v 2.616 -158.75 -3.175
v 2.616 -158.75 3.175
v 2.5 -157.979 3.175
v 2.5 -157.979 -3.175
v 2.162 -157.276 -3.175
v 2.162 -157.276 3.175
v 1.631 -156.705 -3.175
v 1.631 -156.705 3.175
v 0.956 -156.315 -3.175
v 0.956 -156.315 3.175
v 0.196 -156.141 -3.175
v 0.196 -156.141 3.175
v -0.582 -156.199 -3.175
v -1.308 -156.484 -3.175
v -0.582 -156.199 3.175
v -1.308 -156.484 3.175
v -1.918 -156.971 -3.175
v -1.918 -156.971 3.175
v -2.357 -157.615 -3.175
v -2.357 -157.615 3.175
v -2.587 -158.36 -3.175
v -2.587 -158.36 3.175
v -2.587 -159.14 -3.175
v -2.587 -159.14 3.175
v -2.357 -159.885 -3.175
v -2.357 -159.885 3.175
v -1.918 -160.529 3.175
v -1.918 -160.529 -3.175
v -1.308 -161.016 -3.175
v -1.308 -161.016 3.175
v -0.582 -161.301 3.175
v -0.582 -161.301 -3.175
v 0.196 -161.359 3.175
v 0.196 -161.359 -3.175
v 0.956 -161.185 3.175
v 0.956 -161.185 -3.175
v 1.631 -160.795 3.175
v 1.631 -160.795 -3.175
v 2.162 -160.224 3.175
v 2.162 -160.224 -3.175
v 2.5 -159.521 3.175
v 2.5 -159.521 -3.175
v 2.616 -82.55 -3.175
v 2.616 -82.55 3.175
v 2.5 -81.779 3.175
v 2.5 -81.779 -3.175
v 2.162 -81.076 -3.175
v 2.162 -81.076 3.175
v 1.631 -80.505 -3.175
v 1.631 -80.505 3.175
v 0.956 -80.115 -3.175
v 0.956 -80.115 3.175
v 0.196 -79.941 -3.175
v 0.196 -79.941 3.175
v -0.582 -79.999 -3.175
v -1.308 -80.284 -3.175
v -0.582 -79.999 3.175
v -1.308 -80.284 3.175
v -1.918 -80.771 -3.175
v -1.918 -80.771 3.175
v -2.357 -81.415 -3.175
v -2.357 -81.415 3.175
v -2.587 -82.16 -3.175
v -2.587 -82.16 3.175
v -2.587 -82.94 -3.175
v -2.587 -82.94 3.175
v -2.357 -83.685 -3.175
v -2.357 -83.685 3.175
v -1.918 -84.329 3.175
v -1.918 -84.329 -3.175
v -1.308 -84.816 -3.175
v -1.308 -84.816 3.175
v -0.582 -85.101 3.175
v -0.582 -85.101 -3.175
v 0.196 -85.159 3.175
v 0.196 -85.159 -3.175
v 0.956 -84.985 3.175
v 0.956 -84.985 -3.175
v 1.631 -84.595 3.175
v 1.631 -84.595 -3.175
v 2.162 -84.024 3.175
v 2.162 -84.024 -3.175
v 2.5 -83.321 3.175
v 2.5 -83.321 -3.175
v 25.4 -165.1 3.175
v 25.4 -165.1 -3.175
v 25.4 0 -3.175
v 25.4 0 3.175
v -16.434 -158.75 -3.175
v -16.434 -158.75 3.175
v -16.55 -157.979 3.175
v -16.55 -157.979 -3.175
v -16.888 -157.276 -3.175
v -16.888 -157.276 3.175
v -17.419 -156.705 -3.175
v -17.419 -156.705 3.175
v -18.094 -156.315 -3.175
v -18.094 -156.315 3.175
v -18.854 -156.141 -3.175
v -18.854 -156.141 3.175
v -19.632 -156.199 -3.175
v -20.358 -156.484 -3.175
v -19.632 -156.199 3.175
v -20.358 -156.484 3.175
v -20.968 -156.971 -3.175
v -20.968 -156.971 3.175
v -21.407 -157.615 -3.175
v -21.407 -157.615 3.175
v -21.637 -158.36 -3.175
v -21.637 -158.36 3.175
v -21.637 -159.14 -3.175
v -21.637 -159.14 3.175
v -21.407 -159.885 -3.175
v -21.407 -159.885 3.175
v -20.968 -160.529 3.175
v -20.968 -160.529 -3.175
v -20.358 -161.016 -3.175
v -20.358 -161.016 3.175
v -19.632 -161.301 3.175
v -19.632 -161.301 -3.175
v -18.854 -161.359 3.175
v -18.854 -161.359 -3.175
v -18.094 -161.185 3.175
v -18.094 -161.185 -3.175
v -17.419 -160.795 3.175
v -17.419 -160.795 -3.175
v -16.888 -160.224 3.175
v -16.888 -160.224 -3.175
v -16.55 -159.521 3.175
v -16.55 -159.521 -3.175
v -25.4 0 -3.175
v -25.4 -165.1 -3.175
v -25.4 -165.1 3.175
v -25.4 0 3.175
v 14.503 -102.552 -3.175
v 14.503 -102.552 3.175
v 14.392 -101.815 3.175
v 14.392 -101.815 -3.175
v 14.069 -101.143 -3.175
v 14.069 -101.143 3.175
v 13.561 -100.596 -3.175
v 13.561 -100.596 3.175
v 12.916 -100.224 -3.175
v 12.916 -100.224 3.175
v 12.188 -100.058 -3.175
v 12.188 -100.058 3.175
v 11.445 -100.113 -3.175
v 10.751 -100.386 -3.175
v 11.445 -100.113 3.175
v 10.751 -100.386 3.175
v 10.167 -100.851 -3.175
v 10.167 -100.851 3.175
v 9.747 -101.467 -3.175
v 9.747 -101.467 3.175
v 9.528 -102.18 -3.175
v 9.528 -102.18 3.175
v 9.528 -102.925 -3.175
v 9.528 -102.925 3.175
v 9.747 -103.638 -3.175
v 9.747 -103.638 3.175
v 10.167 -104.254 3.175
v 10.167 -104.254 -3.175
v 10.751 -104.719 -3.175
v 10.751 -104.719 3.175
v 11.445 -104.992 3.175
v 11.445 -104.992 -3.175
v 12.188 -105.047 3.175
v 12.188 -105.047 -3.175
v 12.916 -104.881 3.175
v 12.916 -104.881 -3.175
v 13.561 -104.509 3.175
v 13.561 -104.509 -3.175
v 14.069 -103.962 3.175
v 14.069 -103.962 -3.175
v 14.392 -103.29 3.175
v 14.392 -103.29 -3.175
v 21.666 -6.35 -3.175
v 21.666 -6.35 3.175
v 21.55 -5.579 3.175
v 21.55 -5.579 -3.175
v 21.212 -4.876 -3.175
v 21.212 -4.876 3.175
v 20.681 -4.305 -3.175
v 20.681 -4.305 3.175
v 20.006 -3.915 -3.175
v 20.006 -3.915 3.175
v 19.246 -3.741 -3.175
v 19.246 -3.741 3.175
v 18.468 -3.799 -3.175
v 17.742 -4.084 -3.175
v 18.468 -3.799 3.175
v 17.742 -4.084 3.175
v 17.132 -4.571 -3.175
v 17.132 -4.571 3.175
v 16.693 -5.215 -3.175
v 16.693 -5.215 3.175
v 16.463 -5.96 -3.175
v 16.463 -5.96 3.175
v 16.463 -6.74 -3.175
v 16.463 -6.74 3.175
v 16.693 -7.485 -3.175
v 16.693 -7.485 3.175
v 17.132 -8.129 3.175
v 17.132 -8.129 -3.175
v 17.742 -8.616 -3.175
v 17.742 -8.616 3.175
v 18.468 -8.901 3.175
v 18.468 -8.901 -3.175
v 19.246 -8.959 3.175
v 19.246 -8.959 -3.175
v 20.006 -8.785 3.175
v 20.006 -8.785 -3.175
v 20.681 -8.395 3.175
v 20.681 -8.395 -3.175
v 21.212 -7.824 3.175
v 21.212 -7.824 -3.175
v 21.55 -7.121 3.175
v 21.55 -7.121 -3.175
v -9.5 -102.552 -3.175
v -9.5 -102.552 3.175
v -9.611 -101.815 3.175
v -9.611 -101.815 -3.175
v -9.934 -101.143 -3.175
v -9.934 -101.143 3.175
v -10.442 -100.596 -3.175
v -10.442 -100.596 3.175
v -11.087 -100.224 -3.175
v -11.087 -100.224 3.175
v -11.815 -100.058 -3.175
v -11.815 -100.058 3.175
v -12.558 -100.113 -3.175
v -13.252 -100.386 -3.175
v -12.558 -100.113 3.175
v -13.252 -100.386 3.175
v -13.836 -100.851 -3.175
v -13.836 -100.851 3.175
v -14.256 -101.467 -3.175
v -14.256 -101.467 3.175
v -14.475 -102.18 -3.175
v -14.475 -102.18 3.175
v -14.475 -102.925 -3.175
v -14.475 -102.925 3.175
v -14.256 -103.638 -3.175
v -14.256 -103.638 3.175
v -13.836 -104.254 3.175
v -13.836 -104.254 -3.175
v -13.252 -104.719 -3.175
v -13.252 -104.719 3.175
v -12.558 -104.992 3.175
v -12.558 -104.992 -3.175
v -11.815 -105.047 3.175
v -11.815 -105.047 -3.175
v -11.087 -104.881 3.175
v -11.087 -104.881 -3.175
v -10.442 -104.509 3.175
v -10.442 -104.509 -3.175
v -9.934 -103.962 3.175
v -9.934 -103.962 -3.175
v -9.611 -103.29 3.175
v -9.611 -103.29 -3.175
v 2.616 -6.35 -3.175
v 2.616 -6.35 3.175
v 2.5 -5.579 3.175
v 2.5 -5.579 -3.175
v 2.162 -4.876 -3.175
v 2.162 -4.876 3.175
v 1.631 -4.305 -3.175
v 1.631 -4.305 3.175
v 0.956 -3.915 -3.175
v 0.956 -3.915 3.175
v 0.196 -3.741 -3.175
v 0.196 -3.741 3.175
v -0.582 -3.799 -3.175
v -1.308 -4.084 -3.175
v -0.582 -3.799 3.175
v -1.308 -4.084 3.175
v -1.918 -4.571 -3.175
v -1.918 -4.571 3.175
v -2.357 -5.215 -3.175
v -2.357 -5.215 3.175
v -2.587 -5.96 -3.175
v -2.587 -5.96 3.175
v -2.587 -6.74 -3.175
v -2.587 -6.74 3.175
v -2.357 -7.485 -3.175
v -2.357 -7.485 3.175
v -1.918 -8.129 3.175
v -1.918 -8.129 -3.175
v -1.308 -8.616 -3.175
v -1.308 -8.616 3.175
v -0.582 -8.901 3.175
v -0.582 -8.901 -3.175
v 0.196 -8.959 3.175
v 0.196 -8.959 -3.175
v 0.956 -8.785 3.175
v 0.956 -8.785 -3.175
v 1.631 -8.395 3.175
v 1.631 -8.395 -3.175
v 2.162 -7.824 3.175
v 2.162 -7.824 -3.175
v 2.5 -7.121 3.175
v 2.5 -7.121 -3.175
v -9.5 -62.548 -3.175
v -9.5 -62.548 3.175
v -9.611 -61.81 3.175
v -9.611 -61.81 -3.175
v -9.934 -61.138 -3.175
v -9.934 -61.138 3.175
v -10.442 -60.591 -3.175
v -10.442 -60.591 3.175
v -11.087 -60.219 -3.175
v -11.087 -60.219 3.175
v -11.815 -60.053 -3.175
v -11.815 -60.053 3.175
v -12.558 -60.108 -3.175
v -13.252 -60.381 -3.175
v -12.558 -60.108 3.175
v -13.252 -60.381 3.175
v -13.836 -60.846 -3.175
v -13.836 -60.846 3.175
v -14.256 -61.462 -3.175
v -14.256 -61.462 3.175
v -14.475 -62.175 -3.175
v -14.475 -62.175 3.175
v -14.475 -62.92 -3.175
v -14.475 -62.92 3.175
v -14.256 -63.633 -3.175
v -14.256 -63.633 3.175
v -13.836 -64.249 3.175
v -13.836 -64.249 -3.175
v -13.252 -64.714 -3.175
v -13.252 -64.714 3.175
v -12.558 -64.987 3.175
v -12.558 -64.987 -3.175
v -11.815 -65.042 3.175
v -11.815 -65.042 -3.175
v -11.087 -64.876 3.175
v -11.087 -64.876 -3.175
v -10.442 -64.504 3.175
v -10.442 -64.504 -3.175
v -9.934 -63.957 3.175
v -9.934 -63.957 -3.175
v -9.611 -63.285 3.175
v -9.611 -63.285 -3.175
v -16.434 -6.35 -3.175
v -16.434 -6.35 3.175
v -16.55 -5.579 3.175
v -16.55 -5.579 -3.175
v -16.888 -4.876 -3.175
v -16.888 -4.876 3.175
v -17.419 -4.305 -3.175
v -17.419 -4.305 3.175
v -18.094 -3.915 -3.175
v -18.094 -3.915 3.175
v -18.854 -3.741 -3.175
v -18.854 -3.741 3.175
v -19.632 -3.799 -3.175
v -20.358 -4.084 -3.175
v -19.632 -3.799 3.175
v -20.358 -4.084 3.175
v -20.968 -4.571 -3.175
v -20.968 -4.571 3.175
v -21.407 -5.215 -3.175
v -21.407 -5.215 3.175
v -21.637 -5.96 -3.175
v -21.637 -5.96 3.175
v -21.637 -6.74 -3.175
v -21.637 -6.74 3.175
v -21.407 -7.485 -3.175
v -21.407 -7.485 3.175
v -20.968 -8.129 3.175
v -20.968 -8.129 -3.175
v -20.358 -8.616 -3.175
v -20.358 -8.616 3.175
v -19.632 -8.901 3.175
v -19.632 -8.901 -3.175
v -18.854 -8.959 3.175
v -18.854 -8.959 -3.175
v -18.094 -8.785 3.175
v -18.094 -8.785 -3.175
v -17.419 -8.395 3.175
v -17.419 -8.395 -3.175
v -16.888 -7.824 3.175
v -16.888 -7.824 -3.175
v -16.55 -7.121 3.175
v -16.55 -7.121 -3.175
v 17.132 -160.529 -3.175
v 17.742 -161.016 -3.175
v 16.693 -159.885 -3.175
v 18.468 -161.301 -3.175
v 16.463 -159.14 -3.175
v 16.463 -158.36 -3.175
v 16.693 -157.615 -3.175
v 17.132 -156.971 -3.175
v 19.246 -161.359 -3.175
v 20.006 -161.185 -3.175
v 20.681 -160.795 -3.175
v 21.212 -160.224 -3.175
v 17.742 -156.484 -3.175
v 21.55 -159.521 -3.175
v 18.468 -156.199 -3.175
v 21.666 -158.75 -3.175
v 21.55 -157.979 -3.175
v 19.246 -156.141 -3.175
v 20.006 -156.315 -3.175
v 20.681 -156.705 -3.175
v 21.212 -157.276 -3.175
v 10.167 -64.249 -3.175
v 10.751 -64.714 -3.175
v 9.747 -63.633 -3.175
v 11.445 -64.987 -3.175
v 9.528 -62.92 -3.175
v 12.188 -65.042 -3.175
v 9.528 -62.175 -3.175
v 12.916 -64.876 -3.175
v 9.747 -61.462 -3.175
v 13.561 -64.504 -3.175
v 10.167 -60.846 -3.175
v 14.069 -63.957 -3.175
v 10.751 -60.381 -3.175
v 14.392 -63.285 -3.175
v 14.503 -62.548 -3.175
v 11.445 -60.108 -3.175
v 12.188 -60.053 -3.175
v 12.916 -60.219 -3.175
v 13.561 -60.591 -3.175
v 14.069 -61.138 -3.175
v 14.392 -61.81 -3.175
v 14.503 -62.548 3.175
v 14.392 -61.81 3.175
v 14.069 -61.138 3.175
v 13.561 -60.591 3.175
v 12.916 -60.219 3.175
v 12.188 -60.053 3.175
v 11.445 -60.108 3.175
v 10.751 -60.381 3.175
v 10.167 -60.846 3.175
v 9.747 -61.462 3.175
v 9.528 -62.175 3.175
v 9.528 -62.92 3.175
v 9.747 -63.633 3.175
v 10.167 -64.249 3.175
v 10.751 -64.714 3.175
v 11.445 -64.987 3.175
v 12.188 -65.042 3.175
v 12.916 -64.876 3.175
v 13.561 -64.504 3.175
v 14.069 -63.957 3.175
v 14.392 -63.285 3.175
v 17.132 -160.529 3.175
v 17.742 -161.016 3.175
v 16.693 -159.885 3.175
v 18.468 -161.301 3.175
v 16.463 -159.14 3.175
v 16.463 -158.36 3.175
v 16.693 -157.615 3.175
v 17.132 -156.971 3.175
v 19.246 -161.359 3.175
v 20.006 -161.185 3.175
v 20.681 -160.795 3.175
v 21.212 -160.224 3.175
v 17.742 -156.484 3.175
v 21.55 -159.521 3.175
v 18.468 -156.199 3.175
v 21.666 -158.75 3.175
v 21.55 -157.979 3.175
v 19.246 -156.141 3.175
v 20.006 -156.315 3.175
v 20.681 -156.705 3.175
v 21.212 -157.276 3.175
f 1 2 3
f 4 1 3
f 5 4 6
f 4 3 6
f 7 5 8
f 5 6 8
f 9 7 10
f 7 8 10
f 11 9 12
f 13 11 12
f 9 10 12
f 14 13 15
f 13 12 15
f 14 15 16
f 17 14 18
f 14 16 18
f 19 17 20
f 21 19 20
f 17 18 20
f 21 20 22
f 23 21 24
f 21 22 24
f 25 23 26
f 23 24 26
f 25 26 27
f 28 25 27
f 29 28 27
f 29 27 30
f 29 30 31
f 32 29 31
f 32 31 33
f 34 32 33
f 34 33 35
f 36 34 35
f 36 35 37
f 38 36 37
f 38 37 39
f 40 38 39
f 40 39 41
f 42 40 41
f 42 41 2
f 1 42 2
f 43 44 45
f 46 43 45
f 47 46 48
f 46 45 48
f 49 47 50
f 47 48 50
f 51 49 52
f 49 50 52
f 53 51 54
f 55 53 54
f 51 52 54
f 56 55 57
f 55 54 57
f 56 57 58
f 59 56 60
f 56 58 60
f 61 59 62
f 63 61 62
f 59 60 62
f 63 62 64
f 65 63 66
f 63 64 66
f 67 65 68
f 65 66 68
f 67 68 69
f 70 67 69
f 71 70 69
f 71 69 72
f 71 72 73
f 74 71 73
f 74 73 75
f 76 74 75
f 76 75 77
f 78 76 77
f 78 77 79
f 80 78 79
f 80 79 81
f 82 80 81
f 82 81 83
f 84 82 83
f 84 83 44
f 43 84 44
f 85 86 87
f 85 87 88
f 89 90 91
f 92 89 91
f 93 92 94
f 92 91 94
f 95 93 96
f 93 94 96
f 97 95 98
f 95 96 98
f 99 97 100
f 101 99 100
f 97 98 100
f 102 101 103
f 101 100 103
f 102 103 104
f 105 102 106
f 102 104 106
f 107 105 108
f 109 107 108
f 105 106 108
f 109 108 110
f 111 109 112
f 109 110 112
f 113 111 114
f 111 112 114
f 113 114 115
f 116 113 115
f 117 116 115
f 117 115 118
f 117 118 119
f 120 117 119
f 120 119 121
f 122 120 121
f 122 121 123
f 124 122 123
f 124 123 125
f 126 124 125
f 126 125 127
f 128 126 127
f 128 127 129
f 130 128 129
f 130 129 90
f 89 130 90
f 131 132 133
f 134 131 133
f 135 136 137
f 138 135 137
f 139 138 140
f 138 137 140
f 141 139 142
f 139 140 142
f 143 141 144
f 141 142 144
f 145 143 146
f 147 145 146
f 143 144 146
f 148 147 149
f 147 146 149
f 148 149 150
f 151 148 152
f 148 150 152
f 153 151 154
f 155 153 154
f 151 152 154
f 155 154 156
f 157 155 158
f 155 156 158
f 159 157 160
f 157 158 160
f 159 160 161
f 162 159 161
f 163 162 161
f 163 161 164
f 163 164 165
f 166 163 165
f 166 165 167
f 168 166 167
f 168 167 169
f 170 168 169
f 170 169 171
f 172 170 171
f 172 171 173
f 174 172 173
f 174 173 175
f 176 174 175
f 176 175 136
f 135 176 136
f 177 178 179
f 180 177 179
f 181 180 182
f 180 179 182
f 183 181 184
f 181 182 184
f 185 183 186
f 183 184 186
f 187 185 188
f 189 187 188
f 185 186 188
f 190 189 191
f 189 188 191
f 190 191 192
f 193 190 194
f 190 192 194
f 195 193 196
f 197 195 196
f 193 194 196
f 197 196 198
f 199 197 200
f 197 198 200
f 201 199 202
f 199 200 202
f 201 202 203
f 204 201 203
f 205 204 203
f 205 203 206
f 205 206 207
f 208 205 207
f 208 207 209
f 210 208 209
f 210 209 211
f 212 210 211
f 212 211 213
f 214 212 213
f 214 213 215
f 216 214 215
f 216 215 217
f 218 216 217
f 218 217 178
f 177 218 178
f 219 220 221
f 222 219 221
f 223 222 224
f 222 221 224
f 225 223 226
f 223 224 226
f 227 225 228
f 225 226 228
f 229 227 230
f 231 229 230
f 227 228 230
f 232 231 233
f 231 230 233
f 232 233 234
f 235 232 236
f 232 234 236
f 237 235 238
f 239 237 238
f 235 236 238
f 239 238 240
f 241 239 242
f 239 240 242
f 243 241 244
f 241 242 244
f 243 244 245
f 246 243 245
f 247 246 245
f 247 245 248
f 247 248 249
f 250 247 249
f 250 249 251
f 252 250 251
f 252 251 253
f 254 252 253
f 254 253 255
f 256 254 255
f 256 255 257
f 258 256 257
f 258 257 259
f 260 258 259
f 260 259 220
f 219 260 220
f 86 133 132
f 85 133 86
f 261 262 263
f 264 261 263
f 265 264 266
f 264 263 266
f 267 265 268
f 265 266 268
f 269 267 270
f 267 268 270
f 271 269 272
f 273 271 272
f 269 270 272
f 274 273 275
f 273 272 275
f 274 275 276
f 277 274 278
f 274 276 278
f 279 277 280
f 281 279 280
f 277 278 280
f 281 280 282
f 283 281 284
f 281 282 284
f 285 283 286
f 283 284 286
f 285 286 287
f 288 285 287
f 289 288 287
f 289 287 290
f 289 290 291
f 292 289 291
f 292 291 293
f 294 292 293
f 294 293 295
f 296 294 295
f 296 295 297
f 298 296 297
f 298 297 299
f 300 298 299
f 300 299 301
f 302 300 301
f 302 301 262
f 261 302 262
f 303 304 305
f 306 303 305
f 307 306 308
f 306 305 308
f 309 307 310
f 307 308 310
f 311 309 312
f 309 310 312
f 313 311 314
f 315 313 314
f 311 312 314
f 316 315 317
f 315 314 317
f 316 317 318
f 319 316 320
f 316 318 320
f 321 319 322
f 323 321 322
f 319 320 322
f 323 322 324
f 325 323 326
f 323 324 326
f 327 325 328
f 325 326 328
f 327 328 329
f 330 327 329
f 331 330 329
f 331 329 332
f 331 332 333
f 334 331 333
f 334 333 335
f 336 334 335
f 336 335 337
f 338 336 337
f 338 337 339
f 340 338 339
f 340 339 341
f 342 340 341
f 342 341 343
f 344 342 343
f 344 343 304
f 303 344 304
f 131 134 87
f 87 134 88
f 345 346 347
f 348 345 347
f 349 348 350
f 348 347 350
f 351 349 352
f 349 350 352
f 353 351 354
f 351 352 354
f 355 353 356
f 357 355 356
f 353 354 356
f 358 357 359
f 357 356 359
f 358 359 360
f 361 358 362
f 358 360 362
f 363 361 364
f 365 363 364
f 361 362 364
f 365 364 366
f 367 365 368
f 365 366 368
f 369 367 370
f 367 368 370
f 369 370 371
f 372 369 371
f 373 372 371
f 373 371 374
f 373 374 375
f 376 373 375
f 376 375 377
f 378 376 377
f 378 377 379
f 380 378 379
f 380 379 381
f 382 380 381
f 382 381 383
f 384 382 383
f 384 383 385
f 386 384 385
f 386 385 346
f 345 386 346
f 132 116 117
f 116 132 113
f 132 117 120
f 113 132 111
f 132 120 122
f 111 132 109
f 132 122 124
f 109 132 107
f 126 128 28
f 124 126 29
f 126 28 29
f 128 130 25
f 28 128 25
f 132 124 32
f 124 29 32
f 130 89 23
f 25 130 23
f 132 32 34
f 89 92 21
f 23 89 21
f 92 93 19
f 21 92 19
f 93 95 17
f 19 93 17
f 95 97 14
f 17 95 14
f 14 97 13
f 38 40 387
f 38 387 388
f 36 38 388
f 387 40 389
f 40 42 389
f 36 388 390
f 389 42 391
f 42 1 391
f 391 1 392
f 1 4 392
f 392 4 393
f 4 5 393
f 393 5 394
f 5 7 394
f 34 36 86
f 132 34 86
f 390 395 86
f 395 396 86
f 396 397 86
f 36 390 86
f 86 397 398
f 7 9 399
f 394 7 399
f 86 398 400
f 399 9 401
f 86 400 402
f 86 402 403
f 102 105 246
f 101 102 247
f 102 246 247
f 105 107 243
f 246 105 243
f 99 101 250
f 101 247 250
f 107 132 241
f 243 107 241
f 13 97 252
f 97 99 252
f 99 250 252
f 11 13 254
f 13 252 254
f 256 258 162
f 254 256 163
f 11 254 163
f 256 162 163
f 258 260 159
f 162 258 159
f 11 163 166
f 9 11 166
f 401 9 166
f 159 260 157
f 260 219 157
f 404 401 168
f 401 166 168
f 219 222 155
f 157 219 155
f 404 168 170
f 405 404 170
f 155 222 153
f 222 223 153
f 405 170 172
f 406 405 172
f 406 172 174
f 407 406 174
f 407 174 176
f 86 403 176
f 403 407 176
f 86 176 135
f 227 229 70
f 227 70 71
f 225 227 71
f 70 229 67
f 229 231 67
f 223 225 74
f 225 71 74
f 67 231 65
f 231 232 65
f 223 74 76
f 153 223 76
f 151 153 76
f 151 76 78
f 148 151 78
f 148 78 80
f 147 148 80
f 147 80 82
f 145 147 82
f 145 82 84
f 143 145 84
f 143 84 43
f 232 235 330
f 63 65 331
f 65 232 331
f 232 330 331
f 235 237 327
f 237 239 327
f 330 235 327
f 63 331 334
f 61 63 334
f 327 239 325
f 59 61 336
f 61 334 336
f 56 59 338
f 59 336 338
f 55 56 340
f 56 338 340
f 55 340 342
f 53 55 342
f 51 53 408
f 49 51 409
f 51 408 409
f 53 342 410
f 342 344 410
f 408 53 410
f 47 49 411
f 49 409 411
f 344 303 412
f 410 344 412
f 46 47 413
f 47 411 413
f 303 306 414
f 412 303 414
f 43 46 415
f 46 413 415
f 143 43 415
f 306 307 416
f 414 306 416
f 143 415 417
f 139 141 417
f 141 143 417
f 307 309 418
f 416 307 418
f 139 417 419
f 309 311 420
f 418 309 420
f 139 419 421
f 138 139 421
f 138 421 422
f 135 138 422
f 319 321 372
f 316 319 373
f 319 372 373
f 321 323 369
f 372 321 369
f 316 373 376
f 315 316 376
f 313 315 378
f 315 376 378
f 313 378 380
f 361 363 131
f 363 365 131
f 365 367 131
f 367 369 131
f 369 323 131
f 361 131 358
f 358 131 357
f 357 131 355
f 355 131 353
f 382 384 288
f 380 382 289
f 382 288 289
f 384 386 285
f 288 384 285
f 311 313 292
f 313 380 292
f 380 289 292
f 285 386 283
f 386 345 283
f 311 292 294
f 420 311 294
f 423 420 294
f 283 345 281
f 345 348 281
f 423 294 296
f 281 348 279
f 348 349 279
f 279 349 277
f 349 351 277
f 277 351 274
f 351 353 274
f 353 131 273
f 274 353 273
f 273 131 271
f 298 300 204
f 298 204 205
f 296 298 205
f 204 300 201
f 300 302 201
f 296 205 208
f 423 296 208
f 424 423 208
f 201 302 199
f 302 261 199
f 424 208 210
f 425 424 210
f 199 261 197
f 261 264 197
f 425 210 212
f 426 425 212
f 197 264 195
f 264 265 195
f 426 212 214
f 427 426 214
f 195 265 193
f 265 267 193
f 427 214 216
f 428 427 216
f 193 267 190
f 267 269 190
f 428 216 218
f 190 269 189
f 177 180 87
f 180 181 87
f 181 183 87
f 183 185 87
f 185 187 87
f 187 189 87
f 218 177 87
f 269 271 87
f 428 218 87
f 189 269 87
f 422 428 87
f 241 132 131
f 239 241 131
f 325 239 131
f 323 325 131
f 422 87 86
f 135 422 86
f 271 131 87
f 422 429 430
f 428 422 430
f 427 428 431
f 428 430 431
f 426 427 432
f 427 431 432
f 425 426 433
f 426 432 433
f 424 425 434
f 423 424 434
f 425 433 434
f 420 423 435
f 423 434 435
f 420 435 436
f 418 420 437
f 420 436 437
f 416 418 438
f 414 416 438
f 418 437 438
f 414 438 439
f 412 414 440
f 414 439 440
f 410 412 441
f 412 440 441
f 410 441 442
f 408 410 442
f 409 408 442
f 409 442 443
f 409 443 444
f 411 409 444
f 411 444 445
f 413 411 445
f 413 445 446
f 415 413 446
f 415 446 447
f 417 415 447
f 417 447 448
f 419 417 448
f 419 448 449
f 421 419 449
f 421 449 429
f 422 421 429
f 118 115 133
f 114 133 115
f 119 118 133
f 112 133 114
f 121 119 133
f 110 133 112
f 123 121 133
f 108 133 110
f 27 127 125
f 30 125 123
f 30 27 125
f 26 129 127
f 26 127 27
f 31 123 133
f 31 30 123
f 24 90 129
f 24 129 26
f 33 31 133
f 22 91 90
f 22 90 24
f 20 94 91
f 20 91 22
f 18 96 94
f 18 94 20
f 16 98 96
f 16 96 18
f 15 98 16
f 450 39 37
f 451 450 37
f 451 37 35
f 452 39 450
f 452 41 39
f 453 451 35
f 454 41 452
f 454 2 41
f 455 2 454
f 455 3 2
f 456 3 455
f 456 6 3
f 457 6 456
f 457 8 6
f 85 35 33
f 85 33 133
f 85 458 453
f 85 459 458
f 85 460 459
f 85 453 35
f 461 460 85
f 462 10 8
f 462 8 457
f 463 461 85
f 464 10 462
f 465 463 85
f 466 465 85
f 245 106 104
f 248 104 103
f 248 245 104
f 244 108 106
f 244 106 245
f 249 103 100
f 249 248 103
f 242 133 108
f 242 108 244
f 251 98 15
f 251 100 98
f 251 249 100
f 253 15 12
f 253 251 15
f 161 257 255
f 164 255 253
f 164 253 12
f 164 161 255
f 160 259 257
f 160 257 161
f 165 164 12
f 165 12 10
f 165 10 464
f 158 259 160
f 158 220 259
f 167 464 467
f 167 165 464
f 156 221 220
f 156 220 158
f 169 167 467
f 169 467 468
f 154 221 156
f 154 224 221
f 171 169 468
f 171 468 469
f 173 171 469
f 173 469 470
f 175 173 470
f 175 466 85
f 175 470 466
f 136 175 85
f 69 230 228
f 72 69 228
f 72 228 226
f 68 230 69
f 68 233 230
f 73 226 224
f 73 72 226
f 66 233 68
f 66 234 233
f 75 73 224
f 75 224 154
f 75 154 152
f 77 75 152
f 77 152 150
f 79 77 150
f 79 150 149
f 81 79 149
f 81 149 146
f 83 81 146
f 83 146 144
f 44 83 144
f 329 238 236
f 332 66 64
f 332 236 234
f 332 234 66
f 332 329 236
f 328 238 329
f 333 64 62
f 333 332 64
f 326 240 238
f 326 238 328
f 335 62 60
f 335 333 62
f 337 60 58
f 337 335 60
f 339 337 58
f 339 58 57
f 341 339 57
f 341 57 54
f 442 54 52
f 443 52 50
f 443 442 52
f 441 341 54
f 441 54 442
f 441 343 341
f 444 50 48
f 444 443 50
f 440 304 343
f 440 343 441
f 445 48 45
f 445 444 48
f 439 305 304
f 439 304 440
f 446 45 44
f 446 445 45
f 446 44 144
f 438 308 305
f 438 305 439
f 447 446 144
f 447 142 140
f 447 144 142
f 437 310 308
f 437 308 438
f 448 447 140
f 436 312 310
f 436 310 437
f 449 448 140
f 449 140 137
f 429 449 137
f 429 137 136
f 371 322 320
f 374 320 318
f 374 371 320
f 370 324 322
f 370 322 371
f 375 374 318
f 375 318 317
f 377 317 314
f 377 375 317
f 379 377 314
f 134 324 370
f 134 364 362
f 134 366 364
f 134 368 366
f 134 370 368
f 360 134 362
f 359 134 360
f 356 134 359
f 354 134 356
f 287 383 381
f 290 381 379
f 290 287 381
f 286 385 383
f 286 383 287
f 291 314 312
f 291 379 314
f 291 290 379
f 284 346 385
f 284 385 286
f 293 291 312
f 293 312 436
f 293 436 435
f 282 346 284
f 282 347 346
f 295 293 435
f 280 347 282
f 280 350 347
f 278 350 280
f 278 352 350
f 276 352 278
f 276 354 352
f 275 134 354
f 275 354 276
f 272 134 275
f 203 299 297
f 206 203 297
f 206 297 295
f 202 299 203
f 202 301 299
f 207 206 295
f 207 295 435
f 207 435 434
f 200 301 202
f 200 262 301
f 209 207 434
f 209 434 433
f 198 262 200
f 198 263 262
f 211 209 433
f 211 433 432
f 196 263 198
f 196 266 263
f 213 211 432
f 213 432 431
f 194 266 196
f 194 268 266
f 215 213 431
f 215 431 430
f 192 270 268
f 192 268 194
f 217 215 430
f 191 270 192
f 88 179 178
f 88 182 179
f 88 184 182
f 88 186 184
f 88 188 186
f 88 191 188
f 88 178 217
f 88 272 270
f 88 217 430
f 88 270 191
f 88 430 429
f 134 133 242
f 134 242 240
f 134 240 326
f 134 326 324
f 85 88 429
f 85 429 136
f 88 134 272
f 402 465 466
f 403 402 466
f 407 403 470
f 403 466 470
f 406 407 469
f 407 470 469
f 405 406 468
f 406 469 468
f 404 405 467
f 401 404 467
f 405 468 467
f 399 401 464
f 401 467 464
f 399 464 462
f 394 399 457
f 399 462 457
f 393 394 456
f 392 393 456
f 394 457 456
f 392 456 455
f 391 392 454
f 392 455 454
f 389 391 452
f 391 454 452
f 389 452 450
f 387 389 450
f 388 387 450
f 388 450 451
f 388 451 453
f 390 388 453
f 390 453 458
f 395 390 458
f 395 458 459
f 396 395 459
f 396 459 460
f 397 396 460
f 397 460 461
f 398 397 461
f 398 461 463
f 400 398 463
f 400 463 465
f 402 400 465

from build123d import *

# Parameters (mm, degrees)
F0_W     = 50.8
F0_H     = 6.35
F1_DEPTH = 165.1
F2_R     = 2.6162
F2_R_2   = 2.5019
F3_DEPTH = 6.351


with BuildPart() as f1:
    # F0 (on Front) → F1 (new body)
    with BuildSketch(Plane.XZ):
        Rectangle(F0_W, F0_H)
    extrude(amount=F1_DEPTH)

    # F2 (on face) → F3 (cut, through all)
    with BuildSketch(Plane.XY.offset(3.175)):
        with Locations((0, -158.75)):
            Circle(F2_R)
        with Locations((0, -6.35)):
            Circle(F2_R)
        with Locations((-12.0015, -102.5525)):
            Circle(F2_R_2)
        with Locations((12.0015, -102.5525)):
            Circle(F2_R_2)
        with Locations((12.0015, -62.5475)):
            Circle(F2_R_2)
        with Locations((-12.0015, -62.5475)):
            Circle(F2_R_2)
        with Locations((0, -82.55)):
            Circle(F2_R)
        with Locations((-19.05, -158.75)):
            Circle(F2_R)
        with Locations((19.05, -158.75)):
            Circle(F2_R)
        with Locations((-19.05, -6.35)):
            Circle(F2_R)
        with Locations((19.05, -6.35)):
            Circle(F2_R)
    extrude(amount=-F3_DEPTH, mode=Mode.SUBTRACT)


solid = f1.part
